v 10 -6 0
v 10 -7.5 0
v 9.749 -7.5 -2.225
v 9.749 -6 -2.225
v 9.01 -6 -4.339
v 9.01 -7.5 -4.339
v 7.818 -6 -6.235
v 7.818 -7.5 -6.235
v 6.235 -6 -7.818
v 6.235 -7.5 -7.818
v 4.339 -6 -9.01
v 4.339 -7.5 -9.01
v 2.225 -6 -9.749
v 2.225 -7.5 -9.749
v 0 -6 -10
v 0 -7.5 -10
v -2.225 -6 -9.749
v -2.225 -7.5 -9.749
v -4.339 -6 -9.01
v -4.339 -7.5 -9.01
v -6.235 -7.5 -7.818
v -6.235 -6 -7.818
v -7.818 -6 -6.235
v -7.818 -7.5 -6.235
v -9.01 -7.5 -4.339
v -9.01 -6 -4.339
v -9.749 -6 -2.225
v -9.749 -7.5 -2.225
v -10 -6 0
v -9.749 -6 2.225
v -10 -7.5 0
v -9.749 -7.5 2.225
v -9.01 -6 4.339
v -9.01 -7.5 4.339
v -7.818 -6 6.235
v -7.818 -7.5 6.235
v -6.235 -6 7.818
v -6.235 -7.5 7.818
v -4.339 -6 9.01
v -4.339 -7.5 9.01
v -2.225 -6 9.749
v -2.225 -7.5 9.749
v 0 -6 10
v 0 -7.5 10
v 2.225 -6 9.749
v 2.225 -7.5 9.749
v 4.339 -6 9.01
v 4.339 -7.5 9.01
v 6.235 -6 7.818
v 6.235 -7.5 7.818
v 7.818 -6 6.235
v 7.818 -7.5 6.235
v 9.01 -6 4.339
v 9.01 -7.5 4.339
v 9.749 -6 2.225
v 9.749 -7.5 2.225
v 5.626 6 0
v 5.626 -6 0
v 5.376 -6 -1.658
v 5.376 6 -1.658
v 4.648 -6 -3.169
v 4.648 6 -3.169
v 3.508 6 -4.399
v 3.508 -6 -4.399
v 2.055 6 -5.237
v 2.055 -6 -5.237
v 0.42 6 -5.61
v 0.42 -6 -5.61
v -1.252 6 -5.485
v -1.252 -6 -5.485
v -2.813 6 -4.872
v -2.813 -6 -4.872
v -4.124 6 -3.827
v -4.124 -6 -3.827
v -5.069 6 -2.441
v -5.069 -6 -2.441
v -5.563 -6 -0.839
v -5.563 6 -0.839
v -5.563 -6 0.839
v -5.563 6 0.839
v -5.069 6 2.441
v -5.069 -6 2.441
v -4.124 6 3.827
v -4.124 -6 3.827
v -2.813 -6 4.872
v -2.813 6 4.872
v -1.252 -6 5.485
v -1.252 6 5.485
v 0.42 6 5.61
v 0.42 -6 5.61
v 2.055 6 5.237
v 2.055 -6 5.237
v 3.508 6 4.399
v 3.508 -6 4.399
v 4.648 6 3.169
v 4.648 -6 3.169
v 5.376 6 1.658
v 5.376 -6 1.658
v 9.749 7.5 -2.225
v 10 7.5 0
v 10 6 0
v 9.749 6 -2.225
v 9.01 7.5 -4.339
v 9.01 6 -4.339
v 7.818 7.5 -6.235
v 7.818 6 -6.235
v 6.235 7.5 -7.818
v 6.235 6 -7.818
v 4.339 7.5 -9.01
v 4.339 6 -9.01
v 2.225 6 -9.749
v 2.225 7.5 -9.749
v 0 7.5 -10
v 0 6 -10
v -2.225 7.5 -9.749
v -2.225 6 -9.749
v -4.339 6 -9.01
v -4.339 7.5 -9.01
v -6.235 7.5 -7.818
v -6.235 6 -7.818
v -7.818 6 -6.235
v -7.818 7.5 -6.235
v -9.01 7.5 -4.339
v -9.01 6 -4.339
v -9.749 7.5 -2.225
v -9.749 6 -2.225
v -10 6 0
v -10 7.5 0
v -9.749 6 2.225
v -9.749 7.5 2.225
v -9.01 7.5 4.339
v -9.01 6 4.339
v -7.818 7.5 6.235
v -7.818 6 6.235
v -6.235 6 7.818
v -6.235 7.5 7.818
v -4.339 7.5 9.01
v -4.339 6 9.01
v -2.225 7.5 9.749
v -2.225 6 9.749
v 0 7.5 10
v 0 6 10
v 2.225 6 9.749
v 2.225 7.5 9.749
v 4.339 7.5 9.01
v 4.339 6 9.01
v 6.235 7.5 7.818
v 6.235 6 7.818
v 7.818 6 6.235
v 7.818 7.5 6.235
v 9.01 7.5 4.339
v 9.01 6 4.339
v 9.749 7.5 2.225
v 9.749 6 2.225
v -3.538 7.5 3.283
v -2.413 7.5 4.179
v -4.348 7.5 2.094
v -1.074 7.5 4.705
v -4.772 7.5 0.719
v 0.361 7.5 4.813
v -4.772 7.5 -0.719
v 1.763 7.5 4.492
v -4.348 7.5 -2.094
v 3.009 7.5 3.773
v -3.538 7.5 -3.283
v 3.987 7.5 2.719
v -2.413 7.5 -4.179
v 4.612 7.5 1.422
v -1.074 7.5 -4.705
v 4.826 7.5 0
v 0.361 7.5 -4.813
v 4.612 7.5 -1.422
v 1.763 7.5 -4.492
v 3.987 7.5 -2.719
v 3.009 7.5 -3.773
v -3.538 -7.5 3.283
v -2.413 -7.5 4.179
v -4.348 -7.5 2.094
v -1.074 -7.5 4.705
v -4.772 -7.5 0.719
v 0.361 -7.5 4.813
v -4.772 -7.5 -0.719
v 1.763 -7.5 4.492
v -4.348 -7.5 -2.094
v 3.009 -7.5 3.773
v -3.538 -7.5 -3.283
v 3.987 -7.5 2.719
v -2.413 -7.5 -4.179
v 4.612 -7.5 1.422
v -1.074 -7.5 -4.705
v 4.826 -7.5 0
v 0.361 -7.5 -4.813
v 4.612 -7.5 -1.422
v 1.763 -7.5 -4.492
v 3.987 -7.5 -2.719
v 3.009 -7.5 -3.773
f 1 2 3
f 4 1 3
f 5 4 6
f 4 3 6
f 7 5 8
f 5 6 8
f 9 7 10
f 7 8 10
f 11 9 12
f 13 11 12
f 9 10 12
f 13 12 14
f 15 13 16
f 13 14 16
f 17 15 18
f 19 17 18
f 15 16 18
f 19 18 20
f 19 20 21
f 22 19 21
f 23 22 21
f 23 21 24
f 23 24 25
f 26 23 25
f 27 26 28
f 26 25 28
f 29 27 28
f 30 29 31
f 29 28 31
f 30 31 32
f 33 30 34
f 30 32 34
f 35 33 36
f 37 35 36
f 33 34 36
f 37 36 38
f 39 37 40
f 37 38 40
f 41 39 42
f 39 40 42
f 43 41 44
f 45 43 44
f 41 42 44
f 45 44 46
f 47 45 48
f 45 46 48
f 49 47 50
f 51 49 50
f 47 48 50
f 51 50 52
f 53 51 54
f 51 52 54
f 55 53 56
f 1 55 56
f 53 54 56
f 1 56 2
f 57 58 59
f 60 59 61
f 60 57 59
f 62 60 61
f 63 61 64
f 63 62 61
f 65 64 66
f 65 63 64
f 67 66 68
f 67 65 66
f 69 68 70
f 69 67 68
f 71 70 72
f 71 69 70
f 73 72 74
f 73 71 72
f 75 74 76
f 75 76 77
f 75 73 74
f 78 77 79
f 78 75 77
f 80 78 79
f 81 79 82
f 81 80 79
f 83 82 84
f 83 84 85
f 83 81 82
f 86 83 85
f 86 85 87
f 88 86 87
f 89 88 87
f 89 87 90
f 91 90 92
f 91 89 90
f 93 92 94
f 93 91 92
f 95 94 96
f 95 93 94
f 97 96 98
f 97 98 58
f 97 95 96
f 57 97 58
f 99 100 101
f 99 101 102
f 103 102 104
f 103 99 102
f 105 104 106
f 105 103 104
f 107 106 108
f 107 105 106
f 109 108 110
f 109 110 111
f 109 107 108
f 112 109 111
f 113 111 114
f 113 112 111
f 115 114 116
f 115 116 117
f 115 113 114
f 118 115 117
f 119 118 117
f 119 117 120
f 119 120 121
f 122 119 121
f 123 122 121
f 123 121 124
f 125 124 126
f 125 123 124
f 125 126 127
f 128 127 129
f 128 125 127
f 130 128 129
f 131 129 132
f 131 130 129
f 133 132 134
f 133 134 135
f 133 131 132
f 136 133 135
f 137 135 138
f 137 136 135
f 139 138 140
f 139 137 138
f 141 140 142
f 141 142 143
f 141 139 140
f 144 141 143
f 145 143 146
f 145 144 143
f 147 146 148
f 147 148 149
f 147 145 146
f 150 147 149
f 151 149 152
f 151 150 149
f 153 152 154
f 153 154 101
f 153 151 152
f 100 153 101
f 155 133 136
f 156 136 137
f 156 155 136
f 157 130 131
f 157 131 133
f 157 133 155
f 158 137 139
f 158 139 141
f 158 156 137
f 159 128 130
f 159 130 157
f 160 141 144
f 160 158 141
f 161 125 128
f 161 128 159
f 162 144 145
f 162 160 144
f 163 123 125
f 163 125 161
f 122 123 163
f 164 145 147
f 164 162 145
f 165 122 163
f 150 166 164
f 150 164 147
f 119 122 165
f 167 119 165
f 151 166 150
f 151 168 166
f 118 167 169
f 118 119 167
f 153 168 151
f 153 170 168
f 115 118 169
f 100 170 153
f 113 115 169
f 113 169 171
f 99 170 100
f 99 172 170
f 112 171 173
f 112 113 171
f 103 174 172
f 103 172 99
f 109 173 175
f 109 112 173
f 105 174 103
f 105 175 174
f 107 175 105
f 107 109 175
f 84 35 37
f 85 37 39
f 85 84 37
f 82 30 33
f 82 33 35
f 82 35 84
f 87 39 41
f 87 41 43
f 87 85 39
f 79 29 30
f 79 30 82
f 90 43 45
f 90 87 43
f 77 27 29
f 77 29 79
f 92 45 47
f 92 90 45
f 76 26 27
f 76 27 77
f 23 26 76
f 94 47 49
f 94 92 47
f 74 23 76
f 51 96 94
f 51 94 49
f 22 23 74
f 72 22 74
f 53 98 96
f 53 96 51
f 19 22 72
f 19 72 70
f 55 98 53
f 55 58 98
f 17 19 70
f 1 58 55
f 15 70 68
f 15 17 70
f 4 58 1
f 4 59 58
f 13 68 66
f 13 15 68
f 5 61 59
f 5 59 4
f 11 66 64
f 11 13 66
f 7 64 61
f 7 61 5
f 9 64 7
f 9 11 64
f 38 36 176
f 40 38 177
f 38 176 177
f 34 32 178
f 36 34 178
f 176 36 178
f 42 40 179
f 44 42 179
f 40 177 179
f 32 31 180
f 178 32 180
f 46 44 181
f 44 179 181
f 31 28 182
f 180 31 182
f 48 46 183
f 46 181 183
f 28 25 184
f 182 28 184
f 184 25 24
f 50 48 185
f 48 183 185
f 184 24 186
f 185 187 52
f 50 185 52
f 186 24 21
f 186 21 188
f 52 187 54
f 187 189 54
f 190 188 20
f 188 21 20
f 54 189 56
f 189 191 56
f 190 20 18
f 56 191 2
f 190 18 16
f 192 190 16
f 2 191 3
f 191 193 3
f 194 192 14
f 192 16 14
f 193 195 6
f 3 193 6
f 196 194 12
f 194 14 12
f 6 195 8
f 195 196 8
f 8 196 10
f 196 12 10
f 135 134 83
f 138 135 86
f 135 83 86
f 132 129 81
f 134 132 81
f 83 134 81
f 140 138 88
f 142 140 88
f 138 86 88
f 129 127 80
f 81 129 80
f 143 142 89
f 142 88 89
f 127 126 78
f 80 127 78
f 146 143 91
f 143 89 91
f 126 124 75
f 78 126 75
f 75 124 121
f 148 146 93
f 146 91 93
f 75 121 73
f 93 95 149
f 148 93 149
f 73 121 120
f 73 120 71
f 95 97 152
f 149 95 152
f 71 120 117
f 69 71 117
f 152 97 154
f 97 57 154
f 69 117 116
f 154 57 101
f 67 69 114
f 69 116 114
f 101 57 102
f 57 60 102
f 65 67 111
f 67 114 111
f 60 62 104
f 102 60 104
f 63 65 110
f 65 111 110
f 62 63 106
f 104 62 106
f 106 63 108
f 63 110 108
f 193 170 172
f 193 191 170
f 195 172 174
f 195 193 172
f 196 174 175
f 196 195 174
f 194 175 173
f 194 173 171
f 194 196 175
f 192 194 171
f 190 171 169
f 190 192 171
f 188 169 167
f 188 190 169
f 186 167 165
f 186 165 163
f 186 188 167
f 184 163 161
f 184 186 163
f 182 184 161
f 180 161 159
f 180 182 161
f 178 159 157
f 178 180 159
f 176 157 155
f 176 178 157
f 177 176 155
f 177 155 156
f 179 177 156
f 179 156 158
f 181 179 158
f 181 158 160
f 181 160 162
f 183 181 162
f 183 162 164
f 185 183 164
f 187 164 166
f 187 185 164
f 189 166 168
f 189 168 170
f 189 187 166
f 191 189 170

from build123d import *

# Parameters (mm, degrees)
SKETCH1_R           = 5.626
SKETCH1_R_2         = 4.826
BOSS_EXTRUDE1_DEPTH = 7.5
SKETCH2_R           = 10
SKETCH2_R_2         = 5.626
BOSS_EXTRUDE2_DEPTH = 1.5


with BuildPart() as part:
    # Sketch1 → Boss-Extrude1 (new body, symmetric)
    with BuildSketch(Plane(origin=(0, 0, 0), x_dir=(1, 0, 0), z_dir=(0, 1, 0))):
        Circle(SKETCH1_R)
        Circle(SKETCH1_R_2, mode=Mode.SUBTRACT)
    extrude(amount=BOSS_EXTRUDE1_DEPTH, both=True)

    # Sketch2 → Boss-Extrude2 (add)
    with BuildSketch(Plane(origin=(0, 7.5, 0), x_dir=(1, 0, 0), z_dir=(0, 1, 0))):
        Circle(SKETCH2_R)
        Circle(SKETCH2_R_2, mode=Mode.SUBTRACT)
    boss_extrude2 = extrude(amount=-BOSS_EXTRUDE2_DEPTH)

    # Mirror1: Boss-Extrude2 across plane
    add(boss_extrude2.mirror(Plane.ZX))


solid = part.part
